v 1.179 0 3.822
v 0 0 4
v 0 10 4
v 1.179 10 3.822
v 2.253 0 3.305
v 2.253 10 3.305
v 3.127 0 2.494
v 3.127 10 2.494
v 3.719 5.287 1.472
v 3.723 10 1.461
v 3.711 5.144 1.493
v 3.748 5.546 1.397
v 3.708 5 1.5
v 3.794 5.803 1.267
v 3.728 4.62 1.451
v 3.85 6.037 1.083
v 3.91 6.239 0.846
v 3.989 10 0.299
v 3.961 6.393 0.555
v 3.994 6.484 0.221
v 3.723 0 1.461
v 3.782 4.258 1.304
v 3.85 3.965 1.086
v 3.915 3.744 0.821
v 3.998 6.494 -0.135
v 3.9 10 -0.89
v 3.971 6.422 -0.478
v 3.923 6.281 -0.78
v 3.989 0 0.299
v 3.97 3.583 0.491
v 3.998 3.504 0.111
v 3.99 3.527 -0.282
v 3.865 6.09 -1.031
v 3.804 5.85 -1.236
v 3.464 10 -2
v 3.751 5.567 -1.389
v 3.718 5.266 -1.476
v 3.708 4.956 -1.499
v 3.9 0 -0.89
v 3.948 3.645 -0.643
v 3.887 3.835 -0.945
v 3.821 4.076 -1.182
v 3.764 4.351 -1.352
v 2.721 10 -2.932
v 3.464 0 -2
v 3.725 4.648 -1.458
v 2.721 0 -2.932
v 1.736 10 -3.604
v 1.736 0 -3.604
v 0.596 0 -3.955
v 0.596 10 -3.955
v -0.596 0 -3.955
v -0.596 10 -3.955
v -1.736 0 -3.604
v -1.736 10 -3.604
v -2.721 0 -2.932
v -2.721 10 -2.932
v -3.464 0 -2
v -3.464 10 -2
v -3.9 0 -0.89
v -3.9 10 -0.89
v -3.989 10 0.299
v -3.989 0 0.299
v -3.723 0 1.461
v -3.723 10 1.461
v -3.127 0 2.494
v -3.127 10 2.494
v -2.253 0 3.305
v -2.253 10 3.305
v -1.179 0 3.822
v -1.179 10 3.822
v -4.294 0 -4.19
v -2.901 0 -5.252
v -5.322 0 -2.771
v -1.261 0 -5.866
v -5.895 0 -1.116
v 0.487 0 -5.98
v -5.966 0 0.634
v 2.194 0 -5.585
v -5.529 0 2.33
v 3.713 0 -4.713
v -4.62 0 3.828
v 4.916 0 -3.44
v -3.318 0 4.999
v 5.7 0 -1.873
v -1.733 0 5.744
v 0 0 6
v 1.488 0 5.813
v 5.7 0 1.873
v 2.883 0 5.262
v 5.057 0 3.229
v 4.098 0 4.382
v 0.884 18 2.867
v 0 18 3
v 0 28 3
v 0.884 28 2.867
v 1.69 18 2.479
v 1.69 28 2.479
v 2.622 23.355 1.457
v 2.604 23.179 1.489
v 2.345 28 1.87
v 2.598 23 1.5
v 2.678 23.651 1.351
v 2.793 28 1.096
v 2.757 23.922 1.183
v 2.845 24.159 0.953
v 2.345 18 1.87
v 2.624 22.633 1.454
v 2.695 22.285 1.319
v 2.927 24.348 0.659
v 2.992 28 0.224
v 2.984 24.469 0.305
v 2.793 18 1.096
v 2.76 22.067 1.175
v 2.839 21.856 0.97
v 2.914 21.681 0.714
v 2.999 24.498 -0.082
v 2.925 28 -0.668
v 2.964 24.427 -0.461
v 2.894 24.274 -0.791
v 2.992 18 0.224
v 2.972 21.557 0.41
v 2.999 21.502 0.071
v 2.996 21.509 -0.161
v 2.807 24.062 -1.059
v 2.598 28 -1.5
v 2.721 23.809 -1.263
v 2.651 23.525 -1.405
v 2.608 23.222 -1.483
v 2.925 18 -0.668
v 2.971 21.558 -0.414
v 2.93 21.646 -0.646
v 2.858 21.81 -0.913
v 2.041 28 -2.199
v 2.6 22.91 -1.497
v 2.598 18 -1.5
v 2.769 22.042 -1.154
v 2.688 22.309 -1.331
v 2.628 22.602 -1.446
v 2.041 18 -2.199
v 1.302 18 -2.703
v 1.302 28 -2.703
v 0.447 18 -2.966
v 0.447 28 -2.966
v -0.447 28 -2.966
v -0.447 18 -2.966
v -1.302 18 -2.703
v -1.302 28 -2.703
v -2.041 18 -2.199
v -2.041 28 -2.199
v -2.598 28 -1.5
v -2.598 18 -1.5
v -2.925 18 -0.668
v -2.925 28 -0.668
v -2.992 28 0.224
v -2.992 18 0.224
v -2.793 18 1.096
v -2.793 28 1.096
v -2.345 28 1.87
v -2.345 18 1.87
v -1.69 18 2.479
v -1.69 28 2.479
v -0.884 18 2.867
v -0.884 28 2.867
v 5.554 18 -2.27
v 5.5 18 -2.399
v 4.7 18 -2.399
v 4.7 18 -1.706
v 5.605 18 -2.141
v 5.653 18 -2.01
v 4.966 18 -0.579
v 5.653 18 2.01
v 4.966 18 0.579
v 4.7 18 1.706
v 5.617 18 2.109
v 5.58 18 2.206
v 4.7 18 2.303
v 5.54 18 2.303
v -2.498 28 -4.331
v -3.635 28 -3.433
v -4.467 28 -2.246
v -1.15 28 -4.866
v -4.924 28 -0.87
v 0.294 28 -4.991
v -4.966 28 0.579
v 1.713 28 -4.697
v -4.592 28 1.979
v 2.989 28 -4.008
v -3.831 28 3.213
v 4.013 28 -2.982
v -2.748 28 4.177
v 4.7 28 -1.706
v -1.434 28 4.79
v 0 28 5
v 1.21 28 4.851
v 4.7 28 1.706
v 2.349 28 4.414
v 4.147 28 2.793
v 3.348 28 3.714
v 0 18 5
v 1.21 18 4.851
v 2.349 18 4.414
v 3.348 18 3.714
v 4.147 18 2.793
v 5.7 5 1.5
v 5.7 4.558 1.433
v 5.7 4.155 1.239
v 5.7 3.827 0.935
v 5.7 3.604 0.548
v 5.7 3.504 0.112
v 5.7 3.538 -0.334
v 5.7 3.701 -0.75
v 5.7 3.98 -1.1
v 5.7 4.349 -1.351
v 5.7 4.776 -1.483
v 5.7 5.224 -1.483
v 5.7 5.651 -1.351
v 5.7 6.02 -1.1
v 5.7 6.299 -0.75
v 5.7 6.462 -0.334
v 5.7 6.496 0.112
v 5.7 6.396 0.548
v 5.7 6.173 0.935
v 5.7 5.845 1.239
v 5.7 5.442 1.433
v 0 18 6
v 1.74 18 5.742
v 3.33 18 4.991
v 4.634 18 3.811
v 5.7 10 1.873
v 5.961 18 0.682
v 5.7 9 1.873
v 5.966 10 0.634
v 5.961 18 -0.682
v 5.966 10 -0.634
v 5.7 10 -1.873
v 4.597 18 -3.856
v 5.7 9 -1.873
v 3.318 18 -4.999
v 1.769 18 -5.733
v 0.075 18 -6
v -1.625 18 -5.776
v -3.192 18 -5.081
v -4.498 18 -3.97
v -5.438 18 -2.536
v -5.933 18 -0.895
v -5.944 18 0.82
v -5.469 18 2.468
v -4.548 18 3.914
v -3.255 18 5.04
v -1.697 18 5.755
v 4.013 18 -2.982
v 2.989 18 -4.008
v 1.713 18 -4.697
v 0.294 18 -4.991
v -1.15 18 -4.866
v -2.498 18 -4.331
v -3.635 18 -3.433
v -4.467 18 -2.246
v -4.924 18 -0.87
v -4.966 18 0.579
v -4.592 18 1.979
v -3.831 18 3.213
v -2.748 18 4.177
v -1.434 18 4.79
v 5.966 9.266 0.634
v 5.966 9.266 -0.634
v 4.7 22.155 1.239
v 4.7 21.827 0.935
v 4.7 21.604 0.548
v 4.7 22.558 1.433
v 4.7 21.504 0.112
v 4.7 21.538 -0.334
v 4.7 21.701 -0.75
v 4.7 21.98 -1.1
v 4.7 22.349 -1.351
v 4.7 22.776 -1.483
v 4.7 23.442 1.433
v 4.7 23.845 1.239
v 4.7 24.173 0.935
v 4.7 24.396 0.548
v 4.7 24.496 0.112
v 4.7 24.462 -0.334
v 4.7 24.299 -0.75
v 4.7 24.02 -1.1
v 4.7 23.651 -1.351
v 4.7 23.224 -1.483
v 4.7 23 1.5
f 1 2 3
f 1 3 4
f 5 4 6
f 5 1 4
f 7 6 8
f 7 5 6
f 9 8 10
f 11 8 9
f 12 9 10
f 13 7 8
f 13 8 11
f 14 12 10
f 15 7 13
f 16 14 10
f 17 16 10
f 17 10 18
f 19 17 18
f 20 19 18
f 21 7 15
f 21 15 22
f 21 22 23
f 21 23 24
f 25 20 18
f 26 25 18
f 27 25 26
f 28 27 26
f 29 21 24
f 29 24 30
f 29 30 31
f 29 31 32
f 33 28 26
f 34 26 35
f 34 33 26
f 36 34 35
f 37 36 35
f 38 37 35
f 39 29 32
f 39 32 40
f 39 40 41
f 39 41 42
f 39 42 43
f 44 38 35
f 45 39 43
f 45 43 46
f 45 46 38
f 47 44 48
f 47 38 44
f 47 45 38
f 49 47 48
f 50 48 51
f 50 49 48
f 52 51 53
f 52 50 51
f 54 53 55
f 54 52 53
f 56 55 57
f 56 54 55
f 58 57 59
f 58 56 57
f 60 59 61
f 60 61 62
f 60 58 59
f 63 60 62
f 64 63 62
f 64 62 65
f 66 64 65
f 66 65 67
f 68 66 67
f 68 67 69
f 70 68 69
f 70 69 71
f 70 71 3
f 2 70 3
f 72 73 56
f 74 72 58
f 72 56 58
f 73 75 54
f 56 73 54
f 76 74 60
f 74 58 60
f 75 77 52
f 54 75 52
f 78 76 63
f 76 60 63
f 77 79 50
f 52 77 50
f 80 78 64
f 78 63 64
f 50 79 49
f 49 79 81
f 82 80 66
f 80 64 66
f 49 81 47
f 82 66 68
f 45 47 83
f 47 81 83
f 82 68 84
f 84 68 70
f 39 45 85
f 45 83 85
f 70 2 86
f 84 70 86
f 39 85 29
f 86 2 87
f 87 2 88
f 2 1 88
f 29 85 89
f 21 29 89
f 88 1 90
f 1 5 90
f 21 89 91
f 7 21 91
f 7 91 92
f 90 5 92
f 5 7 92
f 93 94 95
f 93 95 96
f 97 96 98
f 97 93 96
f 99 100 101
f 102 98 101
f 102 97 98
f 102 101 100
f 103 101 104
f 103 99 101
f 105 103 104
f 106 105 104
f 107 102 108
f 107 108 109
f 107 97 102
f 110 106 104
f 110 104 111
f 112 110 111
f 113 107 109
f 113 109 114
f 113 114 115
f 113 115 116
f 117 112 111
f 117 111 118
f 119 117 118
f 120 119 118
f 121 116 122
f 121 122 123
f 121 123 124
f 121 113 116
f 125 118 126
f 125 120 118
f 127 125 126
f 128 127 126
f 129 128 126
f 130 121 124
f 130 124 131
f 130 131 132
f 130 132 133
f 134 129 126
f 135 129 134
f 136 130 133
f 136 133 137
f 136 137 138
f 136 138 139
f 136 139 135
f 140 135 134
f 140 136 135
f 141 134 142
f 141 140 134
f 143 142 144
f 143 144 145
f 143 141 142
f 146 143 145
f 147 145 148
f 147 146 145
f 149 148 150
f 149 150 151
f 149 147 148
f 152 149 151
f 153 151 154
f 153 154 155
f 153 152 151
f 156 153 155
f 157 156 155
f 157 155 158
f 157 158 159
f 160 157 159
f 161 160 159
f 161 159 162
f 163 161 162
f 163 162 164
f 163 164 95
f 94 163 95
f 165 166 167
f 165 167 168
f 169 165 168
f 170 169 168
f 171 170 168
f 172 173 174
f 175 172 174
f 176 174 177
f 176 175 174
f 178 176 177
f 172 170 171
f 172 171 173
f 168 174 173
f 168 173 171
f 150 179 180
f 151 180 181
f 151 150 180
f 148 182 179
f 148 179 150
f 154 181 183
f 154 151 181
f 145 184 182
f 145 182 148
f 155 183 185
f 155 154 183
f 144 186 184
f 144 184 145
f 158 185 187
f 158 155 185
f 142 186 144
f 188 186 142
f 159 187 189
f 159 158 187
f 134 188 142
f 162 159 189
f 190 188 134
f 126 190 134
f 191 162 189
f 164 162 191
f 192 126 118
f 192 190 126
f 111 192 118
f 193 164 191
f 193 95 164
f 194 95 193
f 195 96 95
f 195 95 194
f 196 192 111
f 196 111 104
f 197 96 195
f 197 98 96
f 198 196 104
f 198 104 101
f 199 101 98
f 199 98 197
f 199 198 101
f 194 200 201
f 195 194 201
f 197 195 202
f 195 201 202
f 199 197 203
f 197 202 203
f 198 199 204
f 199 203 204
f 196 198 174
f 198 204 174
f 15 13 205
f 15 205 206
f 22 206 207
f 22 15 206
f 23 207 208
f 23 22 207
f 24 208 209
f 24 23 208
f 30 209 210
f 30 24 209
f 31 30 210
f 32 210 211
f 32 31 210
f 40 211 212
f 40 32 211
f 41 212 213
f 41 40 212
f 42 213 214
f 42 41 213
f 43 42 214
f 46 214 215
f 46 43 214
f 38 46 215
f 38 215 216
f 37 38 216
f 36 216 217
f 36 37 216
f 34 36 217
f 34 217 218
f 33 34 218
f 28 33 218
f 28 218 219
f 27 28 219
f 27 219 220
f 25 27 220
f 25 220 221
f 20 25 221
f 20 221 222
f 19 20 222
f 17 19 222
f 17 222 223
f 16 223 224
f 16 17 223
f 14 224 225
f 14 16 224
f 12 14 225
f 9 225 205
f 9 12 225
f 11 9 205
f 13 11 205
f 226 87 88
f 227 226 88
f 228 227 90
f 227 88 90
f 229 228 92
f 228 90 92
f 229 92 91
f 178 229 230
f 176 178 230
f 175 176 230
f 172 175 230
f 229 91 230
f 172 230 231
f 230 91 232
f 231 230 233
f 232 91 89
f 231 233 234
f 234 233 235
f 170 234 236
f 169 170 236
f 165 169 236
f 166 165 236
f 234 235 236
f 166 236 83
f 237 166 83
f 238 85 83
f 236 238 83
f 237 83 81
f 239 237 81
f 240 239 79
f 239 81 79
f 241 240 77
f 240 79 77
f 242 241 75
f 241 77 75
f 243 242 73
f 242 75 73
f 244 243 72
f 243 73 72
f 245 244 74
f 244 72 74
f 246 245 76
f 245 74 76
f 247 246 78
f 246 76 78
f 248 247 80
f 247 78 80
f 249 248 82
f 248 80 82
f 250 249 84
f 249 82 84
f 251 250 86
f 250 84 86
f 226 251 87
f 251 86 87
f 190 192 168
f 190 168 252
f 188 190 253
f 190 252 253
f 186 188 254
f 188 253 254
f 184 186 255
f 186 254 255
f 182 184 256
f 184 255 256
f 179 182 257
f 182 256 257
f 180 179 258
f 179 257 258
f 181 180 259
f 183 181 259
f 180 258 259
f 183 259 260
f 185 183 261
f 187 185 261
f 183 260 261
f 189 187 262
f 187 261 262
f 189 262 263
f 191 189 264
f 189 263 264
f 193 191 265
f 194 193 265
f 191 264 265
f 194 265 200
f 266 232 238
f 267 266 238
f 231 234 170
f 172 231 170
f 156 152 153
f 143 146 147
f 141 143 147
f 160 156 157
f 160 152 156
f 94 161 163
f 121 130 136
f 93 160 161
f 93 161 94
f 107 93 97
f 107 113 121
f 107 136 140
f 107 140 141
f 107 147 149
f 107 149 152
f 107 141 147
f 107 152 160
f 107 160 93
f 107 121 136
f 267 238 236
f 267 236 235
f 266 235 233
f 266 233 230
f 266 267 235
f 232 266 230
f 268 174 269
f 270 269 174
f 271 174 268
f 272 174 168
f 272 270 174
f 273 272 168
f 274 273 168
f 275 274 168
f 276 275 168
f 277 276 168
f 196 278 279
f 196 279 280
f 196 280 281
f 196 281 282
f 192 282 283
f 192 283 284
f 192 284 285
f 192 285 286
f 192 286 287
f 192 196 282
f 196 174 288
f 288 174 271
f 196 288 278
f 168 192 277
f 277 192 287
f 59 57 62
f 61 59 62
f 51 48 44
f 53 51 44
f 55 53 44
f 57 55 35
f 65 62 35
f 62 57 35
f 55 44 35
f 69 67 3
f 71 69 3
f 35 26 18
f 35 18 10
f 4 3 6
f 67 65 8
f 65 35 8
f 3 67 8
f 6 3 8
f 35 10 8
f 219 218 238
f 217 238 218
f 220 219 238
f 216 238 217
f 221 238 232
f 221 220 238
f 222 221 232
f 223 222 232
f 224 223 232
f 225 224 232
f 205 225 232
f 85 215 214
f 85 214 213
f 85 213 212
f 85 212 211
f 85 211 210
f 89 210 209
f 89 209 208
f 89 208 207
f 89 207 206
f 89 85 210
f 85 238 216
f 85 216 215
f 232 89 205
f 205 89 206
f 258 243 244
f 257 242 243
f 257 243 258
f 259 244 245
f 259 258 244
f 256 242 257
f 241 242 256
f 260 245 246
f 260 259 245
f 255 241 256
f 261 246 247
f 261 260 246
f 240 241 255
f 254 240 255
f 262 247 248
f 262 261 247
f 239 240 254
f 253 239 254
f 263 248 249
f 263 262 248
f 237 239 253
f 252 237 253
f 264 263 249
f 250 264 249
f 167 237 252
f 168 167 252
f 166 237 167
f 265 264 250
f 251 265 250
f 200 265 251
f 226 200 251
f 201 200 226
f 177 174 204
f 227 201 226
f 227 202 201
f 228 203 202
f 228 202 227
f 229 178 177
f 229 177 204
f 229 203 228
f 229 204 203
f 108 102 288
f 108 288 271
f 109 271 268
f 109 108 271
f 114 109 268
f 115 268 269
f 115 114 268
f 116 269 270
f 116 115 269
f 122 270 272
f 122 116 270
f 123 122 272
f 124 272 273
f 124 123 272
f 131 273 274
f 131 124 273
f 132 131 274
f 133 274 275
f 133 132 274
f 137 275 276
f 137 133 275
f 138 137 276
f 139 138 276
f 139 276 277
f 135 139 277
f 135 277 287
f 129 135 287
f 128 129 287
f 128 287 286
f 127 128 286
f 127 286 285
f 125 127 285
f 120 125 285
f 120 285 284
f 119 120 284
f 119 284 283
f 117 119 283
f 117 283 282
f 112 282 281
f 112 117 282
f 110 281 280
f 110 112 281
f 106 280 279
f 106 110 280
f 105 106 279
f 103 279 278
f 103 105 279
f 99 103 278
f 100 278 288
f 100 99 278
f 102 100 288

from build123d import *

# Parameters (mm, degrees)
SKETCH1_R           = 6
SKETCH1_R_2         = 4
BOSS_EXTRUDE1_DEPTH = 10
SKETCH2_R           = 6
BOSS_EXTRUDE2_DEPTH = 8
SKETCH3_R           = 5
SKETCH3_R_2         = 3
BOSS_EXTRUDE3_DEPTH = 10
SKETCH4_R           = 1.5
CUT_EXTRUDE1_DEPTH  = 10
SKETCH5_W           = 1.364712806
SKETCH5_H           = 6.528107361
CUT_EXTRUDE2_DEPTH  = 10
CHAMFER1_SIZE       = 1
SKETCH6_W           = 0.953233667
SKETCH6_H           = 4.701860643
CUT_EXTRUDE3_DEPTH  = 10


with BuildPart() as part:
    # Sketch1 → Boss-Extrude1 (new body)
    with BuildSketch(Plane(origin=(0, 0, 0), x_dir=(1, 0, 0), z_dir=(0, 1, 0))):
        with Locations(Location((0, 0, 0), (0, 0, 270))):
            Circle(SKETCH1_R)
        with Locations(Location((0, 0, 0), (0, 0, 270))):
            Circle(SKETCH1_R_2, mode=Mode.SUBTRACT)
    extrude(amount=BOSS_EXTRUDE1_DEPTH)

    # Sketch2 → Boss-Extrude2 (add)
    with BuildSketch(Plane(origin=(0, 10, 0), x_dir=(1, 0, 0), z_dir=(0, 1, 0))):
        with Locations(Location((0, 0, 0), (0, 0, 270))):
            Circle(SKETCH2_R)
    extrude(amount=BOSS_EXTRUDE2_DEPTH)

    # Sketch3 → Boss-Extrude3 (add)
    with BuildSketch(Plane(origin=(0, 18, 0), x_dir=(1, 0, 0), z_dir=(0, 1, 0))):
        with Locations(Location((0, 0, 0), (0, 0, 270))):
            Circle(SKETCH3_R)
        with Locations(Location((0, 0, 0), (0, 0, 270))):
            Circle(SKETCH3_R_2, mode=Mode.SUBTRACT)
    extrude(amount=BOSS_EXTRUDE3_DEPTH)

    # Sketch4 → Cut-Extrude1 (cut)
    with BuildSketch(Plane(origin=(0, 0, 0), x_dir=(0, 0, -1), z_dir=(1, 0, 0))):
        with Locations(Location((0, 5, 0), (0, 0, 180))):
            Circle(SKETCH4_R)
        with Locations(Location((0, 23, 0), (0, 0, 180))):
            Circle(SKETCH4_R)
    extrude(amount=CUT_EXTRUDE1_DEPTH, mode=Mode.SUBTRACT)

    # Sketch5 → Cut-Extrude2 (cut)
    with BuildSketch(Plane.XZ):
        with Locations((6.382356403, -0.325289304)):
            Rectangle(SKETCH5_W, SKETCH5_H)
    extrude(amount=-CUT_EXTRUDE2_DEPTH, mode=Mode.SUBTRACT)

    # Chamfer1
    # the kernel refuses this chamfer: 1 mm, written as the material it adds along each edge
    with BuildSketch(Plane(origin=(5.7, 10, -4.445182387), x_dir=(-0.02749587661058651, -0.9996219169112968, 0), z_dir=(0, 0, 1))) as chamfer1_piece_1_section:
        Polygon((CHAMFER1_SIZE * 0.999621916911, CHAMFER1_SIZE * 0.0274958766106), (-CHAMFER1_SIZE * 0.0274958766106, CHAMFER1_SIZE * 0.999621916911), (0, 0), align=None)
    chamfer1_piece_1 = extrude(amount=8.890364775, mode=Mode.PRIVATE)
    chamfer1_piece_1 = chamfer1_piece_1 & Plane(origin=(0, 9.556619027, 0), x_dir=(0, 0, 1), z_dir=(0, -1, 0)) * Cylinder(6, 22, mode=Mode.PRIVATE)
    add(chamfer1_piece_1)

    # Sketch6 → Cut-Extrude3 (cut)
    with BuildSketch(Plane(origin=(0, 28, 0), x_dir=(1, 0, 0), z_dir=(0, 1, 0))):
        with Locations((5.176616834, 0.047714229)):
            Rectangle(SKETCH6_W, SKETCH6_H)
    extrude(amount=-CUT_EXTRUDE3_DEPTH, mode=Mode.SUBTRACT)


solid = part.part
